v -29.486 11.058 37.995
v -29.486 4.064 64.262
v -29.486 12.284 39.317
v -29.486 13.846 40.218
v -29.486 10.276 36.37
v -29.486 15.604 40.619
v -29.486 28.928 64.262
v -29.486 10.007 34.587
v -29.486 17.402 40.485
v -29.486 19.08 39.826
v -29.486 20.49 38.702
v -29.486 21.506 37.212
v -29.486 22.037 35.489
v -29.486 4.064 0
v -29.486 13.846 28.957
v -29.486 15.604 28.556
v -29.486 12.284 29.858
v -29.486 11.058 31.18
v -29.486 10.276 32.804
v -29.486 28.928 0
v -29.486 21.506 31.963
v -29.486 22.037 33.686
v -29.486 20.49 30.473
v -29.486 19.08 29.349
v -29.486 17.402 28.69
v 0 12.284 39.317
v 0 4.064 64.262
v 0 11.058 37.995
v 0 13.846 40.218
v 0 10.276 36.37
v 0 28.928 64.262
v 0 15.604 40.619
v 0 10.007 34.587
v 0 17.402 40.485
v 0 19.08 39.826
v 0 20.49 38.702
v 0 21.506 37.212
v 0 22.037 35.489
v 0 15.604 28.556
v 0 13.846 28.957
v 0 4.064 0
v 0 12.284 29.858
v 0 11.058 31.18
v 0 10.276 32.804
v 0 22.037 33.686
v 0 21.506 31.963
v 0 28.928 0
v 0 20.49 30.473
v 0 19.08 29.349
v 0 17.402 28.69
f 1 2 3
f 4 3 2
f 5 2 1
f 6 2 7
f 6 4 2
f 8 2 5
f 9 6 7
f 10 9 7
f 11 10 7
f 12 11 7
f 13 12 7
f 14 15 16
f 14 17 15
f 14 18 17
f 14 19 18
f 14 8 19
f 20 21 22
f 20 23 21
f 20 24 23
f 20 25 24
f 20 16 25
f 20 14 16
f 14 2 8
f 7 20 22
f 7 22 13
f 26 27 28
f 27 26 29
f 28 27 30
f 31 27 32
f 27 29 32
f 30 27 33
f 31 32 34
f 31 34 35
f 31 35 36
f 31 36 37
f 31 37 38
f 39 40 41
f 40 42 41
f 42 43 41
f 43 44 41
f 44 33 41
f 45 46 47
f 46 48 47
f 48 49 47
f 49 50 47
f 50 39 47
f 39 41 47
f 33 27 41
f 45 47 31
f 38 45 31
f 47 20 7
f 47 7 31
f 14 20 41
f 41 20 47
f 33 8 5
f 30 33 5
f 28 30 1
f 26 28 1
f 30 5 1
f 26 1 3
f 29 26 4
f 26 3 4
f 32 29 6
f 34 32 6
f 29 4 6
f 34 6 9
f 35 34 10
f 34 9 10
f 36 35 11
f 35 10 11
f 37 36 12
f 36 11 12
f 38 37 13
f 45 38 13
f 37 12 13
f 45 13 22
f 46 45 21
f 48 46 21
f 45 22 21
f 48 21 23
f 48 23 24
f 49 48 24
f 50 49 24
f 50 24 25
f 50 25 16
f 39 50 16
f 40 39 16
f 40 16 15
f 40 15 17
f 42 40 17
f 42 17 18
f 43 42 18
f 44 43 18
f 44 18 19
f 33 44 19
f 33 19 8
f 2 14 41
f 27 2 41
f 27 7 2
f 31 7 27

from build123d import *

# Parameters (mm, degrees)
F0_W       = 29.4857565314
F0_H       = 24.8636654578
F1_DEPTH   = 64.262
F2_R       = 6.0488126263
F1_FACE1_W = 24.8636654578
F1_FACE1_H = 64.262
F3_DEPTH   = 36.322


with BuildPart() as f1:
    # F0 (on Top) → F1 (new body)
    with BuildSketch(Plane.XY):
        with Locations((-14.7428782657, 16.4960857946)):
            Rectangle(F0_W, F0_H)
    extrude(amount=F1_DEPTH)

    # F2 (on face) + F1_face1 (on face) → F3 (cut)
    with BuildSketch(Plane(origin=(-29.4857565314, 0, 0), x_dir=(0, -1, 0), z_dir=(-1, 0, 0))):
        with Locations((-16.0558279604, 34.5874093473)):
            Circle(F2_R)
    with BuildSketch(Plane(origin=(0, 16.4960857946, 32.131), x_dir=(0, 1, 0), z_dir=(1, 0, 0))):
        Rectangle(F1_FACE1_W, F1_FACE1_H)
    extrude(amount=-F3_DEPTH, dir=(-1, 0, 0), mode=Mode.SUBTRACT)


solid = f1.part
